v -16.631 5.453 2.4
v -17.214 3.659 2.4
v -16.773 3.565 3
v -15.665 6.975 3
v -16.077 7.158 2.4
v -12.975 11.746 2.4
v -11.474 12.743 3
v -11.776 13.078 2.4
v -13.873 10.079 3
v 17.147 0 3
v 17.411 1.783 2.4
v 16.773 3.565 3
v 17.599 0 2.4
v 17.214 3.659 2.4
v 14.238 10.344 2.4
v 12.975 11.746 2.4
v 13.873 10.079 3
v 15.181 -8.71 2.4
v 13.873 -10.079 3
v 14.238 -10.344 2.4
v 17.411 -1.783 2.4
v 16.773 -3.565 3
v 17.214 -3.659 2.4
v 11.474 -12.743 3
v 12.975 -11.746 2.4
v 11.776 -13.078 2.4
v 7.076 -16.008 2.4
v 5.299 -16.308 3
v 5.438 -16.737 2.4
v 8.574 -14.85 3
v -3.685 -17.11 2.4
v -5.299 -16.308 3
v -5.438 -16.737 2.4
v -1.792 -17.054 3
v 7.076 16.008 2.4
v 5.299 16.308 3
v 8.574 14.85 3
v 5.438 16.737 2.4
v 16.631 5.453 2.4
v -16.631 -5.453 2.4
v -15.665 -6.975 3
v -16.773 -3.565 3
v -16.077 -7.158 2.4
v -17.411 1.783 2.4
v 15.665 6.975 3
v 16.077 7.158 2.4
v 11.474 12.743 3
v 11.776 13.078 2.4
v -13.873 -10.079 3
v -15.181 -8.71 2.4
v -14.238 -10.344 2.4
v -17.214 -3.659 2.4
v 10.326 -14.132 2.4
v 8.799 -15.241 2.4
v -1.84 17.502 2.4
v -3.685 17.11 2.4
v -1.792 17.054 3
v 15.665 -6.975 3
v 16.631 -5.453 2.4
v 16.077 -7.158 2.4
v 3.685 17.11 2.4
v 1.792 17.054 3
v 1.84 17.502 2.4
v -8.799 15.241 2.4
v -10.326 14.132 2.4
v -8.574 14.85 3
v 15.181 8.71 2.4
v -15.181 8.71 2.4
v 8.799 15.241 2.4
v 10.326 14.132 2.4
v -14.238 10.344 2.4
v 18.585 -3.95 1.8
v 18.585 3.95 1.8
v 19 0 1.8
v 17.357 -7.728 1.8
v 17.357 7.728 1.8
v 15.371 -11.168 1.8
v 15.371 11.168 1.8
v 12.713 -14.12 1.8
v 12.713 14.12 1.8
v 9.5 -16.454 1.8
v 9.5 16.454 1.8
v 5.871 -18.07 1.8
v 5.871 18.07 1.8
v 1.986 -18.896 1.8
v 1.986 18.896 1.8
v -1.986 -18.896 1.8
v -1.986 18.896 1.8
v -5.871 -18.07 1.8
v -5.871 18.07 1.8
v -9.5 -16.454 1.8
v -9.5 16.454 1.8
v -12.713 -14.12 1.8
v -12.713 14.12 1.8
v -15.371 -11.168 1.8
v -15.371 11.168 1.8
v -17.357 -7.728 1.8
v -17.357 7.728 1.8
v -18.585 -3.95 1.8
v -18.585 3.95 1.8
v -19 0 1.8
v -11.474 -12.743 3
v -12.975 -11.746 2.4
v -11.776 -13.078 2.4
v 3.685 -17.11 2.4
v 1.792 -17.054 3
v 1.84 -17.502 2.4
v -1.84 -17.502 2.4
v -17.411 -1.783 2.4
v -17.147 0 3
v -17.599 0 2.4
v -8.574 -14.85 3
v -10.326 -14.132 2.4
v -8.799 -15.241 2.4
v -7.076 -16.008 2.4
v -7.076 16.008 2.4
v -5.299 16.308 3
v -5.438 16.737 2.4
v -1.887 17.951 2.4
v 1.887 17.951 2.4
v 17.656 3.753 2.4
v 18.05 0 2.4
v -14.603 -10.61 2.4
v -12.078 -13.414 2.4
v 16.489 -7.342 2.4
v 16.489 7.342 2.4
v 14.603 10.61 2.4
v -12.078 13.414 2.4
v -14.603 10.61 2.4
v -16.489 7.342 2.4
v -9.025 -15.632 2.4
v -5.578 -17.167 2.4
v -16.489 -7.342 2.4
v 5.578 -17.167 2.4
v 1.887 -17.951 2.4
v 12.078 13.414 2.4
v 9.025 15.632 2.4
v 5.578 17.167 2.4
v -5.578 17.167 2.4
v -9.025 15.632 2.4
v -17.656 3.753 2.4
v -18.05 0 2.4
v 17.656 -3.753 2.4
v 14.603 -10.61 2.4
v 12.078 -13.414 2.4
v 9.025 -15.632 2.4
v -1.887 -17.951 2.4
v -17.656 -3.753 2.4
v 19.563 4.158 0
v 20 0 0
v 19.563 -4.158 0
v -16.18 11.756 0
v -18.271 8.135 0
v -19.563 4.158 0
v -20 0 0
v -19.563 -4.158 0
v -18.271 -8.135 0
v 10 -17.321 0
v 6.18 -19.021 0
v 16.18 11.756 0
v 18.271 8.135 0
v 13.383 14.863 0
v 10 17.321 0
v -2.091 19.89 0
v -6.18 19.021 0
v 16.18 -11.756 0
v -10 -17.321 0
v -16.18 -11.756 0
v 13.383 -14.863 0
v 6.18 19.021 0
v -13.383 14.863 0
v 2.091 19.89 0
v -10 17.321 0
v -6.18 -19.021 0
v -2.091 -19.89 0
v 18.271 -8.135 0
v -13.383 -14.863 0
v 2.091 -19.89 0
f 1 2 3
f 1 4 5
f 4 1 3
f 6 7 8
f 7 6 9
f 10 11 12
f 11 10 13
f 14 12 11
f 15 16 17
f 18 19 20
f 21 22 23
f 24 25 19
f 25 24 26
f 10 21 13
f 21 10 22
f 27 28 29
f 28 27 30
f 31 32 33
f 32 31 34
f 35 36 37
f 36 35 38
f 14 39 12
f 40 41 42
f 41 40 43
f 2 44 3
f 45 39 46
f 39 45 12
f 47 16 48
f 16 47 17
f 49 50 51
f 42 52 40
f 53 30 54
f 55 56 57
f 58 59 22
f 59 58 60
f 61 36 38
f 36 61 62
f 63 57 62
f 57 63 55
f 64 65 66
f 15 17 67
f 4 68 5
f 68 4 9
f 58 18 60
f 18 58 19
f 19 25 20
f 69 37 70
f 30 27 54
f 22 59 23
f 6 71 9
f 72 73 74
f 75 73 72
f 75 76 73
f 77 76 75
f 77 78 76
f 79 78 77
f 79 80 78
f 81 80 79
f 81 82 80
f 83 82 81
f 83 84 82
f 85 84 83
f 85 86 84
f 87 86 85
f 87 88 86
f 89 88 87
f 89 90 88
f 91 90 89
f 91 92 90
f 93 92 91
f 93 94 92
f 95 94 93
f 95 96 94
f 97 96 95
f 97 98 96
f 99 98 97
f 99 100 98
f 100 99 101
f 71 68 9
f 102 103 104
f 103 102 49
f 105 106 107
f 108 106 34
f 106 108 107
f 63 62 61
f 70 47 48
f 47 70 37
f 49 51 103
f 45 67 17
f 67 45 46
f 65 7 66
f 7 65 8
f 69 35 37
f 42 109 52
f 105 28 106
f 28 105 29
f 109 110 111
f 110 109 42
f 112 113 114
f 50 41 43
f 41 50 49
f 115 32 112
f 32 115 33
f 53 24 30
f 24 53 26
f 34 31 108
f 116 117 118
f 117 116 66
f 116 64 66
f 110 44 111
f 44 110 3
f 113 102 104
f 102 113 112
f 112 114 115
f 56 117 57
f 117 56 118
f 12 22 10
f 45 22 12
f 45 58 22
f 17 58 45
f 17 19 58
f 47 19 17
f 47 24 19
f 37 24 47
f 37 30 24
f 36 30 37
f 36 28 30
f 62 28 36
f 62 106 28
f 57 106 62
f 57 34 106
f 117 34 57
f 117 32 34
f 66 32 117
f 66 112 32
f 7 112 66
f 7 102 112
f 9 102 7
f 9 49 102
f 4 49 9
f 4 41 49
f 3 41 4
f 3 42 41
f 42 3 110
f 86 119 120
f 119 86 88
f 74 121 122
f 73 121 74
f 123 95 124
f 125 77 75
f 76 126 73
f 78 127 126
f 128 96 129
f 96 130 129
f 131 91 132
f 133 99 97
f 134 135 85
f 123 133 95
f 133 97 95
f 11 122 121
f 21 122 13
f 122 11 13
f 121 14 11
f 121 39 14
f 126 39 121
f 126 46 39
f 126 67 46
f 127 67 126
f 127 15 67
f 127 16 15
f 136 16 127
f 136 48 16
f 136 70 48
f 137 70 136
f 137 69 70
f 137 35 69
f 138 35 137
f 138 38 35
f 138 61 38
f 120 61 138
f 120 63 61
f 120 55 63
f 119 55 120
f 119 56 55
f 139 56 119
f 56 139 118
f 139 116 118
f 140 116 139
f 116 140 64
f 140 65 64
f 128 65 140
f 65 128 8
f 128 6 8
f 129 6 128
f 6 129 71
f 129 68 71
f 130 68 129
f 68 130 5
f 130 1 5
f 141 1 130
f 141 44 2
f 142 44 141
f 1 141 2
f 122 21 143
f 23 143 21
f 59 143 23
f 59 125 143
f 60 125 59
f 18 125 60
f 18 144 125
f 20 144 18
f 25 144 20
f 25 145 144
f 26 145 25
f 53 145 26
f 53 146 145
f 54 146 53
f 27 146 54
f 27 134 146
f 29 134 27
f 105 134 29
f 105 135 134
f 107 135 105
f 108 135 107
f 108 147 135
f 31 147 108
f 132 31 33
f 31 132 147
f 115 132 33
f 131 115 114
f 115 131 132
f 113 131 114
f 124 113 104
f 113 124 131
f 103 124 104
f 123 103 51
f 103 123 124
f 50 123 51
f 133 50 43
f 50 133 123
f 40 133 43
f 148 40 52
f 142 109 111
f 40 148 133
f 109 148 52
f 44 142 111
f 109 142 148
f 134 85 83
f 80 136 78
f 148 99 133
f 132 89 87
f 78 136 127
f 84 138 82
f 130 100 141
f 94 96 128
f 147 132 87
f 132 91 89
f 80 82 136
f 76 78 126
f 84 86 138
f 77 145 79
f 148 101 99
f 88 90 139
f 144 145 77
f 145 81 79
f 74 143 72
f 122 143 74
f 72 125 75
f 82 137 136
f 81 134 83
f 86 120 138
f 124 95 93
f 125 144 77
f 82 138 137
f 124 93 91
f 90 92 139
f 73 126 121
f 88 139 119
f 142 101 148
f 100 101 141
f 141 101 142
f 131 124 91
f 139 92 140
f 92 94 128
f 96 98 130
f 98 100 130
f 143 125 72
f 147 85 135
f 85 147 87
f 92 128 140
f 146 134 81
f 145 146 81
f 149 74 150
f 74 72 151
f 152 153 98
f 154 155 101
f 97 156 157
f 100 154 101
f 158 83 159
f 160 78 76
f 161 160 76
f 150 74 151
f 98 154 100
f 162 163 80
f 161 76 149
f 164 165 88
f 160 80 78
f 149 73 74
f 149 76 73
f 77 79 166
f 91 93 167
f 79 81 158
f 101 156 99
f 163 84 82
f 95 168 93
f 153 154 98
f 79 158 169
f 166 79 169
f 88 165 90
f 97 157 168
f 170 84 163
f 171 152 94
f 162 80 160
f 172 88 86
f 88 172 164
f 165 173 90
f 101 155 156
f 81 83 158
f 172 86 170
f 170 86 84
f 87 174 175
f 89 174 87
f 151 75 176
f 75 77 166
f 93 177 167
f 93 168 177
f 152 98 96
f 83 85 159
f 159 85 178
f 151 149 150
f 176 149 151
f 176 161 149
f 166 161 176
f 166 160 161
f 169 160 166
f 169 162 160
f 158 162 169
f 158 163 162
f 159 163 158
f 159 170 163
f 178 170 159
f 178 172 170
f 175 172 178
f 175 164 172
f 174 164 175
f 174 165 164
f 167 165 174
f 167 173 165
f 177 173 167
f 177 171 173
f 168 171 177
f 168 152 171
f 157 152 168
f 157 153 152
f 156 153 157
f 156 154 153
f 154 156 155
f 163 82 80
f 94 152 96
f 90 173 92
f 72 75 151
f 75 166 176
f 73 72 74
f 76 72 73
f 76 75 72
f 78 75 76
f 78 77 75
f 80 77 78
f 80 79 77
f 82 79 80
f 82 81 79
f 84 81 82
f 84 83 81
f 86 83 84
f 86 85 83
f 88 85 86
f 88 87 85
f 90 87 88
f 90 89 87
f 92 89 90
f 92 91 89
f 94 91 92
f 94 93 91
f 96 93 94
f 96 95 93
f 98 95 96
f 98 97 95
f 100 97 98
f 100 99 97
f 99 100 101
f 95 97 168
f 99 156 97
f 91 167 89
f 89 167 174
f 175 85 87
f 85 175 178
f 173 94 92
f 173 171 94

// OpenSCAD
/* [Base] */

base_type = 1; //	[1:Cool, 2:Basic, 3:Plain]
base_shape = 30; //	[30:Low-res Circle, 100: Hi-res Circle, 5:Pentagon, 6:Hexagon, 8:Octagon, 4:Square, 3:Triangle]

diameter = 20; // [5:100]
height = 3; // [1:35]
slant = 95; // [50:100]

// Percentage: 
stretch = 100; // [50:200]

//('Cool' base only)
inner_circle_ratio = 40; // [10:80]

/* [Color] */
red = 136; // [0:255]
green = 118; // [0:255]
blue = 155; // [0:255]

color([red/255, green/255, blue/255])
union(){    
    scale([stretch/100, 1, 1]){
        if (base_type == 1){
            // Cool base
            
            cyl1_height = height * (1-inner_circle_ratio/100);
            cylinder(cyl1_height, diameter, diameter * slant/100, $fn=base_shape);
            
            cyl2_diameter = diameter  * slant/100 * .95;
            cyl2_height = height - cyl1_height;
            
            translate([0, 0, cyl1_height]){
                // Cylinder 2
                //color("green")        
                cylinder(cyl2_height, cyl2_diameter, cyl2_diameter * slant/100, $fn=base_shape);
                
                // Cylinder 3
                
                cylinder(cyl2_height*.5, diameter * slant/100, cyl2_diameter, $fn=base_shape);
            }
        } else if (base_type == 2){
            // Okay Base
            cylinder(height, diameter, diameter * slant/100, $fn=base_shape);
        } else if (base_type == 3){
            // Boring Circle Base
            
            cylinder(height, diameter, diameter, $fn=base_shape);
        } 
    }
}
